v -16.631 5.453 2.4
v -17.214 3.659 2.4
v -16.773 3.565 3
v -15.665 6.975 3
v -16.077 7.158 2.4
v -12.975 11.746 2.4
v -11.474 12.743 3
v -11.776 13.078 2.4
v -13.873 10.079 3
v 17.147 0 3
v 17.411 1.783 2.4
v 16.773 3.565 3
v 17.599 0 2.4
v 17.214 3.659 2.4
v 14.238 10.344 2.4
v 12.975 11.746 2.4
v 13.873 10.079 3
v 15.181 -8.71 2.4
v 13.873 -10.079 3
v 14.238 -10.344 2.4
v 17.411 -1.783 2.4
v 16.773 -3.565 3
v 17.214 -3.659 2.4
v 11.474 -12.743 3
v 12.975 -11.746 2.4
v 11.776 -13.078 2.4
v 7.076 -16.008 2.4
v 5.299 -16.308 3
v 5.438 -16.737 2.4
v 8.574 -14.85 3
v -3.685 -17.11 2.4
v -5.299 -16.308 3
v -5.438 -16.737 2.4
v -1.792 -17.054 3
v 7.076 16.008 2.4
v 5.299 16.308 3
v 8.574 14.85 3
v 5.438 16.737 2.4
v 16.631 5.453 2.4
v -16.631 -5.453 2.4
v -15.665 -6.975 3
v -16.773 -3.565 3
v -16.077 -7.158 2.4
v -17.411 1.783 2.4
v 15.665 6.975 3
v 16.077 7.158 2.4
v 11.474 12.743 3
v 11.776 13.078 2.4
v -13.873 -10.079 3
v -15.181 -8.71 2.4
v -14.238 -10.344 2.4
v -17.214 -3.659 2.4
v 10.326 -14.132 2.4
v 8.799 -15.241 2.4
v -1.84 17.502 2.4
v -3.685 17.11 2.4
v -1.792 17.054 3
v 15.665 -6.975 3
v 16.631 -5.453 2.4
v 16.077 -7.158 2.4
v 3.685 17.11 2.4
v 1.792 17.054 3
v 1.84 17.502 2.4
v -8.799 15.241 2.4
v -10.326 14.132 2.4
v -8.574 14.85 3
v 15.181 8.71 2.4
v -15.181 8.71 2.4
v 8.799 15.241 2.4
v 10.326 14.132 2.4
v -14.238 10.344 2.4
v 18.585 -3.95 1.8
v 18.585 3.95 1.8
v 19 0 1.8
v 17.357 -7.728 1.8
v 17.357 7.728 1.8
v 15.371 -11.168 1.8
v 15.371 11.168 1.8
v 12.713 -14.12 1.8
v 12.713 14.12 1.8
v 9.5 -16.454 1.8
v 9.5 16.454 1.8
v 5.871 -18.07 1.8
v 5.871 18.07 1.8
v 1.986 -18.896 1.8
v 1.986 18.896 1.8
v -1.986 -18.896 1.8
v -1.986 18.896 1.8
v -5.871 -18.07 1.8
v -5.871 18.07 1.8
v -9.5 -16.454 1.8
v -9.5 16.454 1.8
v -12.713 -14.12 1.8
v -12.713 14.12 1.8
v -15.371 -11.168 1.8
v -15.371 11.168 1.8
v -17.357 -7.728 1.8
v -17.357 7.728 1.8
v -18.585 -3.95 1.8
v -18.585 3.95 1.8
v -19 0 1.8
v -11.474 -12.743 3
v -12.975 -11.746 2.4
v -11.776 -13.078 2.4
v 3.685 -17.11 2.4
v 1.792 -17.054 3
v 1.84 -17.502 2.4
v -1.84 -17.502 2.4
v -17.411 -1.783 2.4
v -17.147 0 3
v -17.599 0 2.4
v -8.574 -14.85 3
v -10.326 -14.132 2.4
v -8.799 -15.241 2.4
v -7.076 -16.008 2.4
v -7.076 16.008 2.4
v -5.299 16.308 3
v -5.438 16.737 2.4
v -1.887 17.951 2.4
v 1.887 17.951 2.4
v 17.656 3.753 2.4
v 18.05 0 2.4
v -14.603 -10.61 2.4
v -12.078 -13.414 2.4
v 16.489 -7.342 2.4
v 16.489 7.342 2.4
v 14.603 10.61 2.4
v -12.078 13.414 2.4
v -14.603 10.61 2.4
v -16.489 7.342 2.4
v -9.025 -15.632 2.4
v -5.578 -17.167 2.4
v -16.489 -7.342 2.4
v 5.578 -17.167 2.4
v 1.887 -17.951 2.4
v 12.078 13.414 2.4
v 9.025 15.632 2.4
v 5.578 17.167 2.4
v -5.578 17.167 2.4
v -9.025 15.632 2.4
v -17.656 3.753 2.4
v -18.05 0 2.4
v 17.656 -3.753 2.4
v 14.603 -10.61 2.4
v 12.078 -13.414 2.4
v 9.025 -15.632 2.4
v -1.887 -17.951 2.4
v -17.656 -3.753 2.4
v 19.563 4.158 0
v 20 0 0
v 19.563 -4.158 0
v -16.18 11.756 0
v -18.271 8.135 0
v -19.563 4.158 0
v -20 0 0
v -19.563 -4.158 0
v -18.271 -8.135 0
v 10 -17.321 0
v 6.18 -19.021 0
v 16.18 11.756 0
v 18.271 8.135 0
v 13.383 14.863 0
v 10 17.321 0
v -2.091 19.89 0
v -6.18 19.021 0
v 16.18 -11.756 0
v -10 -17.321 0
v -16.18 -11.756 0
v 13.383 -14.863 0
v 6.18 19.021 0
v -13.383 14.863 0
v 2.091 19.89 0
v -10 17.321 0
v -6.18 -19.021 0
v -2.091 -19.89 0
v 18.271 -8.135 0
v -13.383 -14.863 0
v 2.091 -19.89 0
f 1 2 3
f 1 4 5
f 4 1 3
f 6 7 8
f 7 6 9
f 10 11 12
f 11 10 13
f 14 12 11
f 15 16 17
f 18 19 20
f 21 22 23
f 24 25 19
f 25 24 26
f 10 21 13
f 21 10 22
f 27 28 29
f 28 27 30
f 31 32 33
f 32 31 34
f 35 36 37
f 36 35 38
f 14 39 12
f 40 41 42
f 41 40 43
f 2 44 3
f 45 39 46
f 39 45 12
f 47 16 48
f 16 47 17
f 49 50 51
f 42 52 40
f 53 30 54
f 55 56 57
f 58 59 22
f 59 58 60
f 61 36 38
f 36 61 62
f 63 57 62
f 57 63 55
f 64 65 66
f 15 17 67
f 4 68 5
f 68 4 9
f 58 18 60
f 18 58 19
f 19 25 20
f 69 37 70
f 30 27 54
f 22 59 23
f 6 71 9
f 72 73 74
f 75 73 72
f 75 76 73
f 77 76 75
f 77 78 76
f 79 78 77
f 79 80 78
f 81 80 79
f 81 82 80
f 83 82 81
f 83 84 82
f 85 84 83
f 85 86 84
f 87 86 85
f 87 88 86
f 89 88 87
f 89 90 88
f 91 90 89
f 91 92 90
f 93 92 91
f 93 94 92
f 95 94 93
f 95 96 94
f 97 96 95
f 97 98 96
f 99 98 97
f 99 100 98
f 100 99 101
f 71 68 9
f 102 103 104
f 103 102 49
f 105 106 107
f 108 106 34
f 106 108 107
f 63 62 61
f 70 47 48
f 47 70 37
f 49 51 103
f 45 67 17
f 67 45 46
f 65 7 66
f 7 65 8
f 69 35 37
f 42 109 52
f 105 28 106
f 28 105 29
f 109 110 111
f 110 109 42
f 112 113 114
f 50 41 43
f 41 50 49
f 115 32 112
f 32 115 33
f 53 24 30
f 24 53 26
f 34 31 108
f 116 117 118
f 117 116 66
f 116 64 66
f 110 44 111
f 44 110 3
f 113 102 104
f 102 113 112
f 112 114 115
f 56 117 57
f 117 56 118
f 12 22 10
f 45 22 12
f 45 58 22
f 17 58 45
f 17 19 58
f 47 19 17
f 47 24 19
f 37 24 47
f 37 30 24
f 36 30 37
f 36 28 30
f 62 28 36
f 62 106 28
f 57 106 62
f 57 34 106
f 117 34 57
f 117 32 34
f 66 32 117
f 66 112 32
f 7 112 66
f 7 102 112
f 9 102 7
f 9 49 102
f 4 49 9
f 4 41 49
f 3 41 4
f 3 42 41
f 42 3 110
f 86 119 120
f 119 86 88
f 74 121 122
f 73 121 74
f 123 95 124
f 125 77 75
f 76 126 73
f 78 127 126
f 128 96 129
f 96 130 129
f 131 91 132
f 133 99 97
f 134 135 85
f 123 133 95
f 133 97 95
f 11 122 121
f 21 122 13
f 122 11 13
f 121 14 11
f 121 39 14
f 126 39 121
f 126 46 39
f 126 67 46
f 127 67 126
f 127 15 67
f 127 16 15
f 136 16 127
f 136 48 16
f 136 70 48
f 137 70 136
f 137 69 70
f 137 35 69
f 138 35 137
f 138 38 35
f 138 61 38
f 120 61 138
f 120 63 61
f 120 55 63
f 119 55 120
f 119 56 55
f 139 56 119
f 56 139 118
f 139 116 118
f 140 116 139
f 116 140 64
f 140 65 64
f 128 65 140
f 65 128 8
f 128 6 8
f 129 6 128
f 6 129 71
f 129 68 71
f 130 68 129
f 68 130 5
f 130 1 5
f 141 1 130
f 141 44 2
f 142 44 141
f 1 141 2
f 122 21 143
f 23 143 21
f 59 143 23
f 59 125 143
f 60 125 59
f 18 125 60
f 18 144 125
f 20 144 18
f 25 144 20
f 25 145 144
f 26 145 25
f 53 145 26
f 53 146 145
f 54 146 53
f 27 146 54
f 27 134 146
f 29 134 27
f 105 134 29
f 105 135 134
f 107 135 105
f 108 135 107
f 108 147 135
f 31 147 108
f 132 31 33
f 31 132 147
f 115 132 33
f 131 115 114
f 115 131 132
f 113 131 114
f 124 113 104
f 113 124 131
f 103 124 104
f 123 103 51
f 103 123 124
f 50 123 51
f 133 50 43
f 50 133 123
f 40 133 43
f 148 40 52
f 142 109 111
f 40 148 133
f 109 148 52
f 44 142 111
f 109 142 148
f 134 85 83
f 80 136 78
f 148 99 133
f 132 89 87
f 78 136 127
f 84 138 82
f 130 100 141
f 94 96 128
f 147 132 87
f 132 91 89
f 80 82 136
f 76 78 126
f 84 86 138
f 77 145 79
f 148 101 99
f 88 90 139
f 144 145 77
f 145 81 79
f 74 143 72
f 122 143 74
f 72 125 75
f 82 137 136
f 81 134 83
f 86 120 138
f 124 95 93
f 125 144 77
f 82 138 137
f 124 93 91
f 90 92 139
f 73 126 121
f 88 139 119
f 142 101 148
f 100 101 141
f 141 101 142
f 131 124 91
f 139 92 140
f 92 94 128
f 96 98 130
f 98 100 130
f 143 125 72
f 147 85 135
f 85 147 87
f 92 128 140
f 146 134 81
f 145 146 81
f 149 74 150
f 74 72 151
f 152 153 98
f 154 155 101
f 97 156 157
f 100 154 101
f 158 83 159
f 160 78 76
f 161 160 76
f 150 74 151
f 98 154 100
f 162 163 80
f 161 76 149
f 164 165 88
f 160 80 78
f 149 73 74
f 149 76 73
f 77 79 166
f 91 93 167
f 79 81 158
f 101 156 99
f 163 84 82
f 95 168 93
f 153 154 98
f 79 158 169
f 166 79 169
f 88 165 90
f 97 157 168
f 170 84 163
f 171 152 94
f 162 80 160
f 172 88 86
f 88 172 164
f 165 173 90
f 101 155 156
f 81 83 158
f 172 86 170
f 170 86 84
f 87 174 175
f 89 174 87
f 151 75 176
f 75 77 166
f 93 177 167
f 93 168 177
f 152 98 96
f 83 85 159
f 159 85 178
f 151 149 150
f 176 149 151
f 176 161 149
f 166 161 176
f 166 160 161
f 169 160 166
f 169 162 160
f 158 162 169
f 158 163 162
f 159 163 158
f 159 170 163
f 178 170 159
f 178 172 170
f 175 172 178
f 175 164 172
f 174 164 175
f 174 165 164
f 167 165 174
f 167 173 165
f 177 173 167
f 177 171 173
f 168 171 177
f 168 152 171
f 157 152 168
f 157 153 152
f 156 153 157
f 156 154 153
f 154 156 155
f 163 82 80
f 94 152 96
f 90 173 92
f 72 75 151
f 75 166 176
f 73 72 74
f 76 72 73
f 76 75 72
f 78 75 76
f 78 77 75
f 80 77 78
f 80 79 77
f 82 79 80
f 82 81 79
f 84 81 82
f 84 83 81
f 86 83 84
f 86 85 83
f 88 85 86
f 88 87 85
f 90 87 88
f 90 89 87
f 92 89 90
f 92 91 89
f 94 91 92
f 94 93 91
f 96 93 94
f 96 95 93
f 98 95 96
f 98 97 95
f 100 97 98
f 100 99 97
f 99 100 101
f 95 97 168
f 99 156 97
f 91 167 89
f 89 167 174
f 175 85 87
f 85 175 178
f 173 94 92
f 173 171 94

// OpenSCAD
/* [Base] */

base_type = 1; //	[1:Cool, 2:Basic, 3:Plain]
base_shape = 30; //	[30:Low-res Circle, 100: Hi-res Circle, 5:Pentagon, 6:Hexagon, 8:Octagon, 4:Square, 3:Triangle]

diameter = 20; // [5:100]
height = 3; // [1:35]
slant = 95; // [50:100]

// Percentage: 
stretch = 100; // [50:200]

//('Cool' base only)
inner_circle_ratio = 40; // [10:80]

/* [Color] */
red = 136; // [0:255]
green = 118; // [0:255]
blue = 155; // [0:255]

color([red/255, green/255, blue/255])
union(){    
    scale([stretch/100, 1, 1]){
        if (base_type == 1){
            // Cool base
            
            cyl1_height = height * (1-inner_circle_ratio/100);
            cylinder(cyl1_height, diameter, diameter * slant/100, $fn=base_shape);
            
            cyl2_diameter = diameter  * slant/100 * .95;
            cyl2_height = height - cyl1_height;
            
            translate([0, 0, cyl1_height]){
                // Cylinder 2
                //color("green")        
                cylinder(cyl2_height, cyl2_diameter, cyl2_diameter * slant/100, $fn=base_shape);
                
                // Cylinder 3
                
                cylinder(cyl2_height*.5, diameter * slant/100, cyl2_diameter, $fn=base_shape);
            }
        } else if (base_type == 2){
            // Okay Base
            cylinder(height, diameter, diameter * slant/100, $fn=base_shape);
        } else if (base_type == 3){
            // Boring Circle Base
            
            cylinder(height, diameter, diameter, $fn=base_shape);
        } 
    }
}
